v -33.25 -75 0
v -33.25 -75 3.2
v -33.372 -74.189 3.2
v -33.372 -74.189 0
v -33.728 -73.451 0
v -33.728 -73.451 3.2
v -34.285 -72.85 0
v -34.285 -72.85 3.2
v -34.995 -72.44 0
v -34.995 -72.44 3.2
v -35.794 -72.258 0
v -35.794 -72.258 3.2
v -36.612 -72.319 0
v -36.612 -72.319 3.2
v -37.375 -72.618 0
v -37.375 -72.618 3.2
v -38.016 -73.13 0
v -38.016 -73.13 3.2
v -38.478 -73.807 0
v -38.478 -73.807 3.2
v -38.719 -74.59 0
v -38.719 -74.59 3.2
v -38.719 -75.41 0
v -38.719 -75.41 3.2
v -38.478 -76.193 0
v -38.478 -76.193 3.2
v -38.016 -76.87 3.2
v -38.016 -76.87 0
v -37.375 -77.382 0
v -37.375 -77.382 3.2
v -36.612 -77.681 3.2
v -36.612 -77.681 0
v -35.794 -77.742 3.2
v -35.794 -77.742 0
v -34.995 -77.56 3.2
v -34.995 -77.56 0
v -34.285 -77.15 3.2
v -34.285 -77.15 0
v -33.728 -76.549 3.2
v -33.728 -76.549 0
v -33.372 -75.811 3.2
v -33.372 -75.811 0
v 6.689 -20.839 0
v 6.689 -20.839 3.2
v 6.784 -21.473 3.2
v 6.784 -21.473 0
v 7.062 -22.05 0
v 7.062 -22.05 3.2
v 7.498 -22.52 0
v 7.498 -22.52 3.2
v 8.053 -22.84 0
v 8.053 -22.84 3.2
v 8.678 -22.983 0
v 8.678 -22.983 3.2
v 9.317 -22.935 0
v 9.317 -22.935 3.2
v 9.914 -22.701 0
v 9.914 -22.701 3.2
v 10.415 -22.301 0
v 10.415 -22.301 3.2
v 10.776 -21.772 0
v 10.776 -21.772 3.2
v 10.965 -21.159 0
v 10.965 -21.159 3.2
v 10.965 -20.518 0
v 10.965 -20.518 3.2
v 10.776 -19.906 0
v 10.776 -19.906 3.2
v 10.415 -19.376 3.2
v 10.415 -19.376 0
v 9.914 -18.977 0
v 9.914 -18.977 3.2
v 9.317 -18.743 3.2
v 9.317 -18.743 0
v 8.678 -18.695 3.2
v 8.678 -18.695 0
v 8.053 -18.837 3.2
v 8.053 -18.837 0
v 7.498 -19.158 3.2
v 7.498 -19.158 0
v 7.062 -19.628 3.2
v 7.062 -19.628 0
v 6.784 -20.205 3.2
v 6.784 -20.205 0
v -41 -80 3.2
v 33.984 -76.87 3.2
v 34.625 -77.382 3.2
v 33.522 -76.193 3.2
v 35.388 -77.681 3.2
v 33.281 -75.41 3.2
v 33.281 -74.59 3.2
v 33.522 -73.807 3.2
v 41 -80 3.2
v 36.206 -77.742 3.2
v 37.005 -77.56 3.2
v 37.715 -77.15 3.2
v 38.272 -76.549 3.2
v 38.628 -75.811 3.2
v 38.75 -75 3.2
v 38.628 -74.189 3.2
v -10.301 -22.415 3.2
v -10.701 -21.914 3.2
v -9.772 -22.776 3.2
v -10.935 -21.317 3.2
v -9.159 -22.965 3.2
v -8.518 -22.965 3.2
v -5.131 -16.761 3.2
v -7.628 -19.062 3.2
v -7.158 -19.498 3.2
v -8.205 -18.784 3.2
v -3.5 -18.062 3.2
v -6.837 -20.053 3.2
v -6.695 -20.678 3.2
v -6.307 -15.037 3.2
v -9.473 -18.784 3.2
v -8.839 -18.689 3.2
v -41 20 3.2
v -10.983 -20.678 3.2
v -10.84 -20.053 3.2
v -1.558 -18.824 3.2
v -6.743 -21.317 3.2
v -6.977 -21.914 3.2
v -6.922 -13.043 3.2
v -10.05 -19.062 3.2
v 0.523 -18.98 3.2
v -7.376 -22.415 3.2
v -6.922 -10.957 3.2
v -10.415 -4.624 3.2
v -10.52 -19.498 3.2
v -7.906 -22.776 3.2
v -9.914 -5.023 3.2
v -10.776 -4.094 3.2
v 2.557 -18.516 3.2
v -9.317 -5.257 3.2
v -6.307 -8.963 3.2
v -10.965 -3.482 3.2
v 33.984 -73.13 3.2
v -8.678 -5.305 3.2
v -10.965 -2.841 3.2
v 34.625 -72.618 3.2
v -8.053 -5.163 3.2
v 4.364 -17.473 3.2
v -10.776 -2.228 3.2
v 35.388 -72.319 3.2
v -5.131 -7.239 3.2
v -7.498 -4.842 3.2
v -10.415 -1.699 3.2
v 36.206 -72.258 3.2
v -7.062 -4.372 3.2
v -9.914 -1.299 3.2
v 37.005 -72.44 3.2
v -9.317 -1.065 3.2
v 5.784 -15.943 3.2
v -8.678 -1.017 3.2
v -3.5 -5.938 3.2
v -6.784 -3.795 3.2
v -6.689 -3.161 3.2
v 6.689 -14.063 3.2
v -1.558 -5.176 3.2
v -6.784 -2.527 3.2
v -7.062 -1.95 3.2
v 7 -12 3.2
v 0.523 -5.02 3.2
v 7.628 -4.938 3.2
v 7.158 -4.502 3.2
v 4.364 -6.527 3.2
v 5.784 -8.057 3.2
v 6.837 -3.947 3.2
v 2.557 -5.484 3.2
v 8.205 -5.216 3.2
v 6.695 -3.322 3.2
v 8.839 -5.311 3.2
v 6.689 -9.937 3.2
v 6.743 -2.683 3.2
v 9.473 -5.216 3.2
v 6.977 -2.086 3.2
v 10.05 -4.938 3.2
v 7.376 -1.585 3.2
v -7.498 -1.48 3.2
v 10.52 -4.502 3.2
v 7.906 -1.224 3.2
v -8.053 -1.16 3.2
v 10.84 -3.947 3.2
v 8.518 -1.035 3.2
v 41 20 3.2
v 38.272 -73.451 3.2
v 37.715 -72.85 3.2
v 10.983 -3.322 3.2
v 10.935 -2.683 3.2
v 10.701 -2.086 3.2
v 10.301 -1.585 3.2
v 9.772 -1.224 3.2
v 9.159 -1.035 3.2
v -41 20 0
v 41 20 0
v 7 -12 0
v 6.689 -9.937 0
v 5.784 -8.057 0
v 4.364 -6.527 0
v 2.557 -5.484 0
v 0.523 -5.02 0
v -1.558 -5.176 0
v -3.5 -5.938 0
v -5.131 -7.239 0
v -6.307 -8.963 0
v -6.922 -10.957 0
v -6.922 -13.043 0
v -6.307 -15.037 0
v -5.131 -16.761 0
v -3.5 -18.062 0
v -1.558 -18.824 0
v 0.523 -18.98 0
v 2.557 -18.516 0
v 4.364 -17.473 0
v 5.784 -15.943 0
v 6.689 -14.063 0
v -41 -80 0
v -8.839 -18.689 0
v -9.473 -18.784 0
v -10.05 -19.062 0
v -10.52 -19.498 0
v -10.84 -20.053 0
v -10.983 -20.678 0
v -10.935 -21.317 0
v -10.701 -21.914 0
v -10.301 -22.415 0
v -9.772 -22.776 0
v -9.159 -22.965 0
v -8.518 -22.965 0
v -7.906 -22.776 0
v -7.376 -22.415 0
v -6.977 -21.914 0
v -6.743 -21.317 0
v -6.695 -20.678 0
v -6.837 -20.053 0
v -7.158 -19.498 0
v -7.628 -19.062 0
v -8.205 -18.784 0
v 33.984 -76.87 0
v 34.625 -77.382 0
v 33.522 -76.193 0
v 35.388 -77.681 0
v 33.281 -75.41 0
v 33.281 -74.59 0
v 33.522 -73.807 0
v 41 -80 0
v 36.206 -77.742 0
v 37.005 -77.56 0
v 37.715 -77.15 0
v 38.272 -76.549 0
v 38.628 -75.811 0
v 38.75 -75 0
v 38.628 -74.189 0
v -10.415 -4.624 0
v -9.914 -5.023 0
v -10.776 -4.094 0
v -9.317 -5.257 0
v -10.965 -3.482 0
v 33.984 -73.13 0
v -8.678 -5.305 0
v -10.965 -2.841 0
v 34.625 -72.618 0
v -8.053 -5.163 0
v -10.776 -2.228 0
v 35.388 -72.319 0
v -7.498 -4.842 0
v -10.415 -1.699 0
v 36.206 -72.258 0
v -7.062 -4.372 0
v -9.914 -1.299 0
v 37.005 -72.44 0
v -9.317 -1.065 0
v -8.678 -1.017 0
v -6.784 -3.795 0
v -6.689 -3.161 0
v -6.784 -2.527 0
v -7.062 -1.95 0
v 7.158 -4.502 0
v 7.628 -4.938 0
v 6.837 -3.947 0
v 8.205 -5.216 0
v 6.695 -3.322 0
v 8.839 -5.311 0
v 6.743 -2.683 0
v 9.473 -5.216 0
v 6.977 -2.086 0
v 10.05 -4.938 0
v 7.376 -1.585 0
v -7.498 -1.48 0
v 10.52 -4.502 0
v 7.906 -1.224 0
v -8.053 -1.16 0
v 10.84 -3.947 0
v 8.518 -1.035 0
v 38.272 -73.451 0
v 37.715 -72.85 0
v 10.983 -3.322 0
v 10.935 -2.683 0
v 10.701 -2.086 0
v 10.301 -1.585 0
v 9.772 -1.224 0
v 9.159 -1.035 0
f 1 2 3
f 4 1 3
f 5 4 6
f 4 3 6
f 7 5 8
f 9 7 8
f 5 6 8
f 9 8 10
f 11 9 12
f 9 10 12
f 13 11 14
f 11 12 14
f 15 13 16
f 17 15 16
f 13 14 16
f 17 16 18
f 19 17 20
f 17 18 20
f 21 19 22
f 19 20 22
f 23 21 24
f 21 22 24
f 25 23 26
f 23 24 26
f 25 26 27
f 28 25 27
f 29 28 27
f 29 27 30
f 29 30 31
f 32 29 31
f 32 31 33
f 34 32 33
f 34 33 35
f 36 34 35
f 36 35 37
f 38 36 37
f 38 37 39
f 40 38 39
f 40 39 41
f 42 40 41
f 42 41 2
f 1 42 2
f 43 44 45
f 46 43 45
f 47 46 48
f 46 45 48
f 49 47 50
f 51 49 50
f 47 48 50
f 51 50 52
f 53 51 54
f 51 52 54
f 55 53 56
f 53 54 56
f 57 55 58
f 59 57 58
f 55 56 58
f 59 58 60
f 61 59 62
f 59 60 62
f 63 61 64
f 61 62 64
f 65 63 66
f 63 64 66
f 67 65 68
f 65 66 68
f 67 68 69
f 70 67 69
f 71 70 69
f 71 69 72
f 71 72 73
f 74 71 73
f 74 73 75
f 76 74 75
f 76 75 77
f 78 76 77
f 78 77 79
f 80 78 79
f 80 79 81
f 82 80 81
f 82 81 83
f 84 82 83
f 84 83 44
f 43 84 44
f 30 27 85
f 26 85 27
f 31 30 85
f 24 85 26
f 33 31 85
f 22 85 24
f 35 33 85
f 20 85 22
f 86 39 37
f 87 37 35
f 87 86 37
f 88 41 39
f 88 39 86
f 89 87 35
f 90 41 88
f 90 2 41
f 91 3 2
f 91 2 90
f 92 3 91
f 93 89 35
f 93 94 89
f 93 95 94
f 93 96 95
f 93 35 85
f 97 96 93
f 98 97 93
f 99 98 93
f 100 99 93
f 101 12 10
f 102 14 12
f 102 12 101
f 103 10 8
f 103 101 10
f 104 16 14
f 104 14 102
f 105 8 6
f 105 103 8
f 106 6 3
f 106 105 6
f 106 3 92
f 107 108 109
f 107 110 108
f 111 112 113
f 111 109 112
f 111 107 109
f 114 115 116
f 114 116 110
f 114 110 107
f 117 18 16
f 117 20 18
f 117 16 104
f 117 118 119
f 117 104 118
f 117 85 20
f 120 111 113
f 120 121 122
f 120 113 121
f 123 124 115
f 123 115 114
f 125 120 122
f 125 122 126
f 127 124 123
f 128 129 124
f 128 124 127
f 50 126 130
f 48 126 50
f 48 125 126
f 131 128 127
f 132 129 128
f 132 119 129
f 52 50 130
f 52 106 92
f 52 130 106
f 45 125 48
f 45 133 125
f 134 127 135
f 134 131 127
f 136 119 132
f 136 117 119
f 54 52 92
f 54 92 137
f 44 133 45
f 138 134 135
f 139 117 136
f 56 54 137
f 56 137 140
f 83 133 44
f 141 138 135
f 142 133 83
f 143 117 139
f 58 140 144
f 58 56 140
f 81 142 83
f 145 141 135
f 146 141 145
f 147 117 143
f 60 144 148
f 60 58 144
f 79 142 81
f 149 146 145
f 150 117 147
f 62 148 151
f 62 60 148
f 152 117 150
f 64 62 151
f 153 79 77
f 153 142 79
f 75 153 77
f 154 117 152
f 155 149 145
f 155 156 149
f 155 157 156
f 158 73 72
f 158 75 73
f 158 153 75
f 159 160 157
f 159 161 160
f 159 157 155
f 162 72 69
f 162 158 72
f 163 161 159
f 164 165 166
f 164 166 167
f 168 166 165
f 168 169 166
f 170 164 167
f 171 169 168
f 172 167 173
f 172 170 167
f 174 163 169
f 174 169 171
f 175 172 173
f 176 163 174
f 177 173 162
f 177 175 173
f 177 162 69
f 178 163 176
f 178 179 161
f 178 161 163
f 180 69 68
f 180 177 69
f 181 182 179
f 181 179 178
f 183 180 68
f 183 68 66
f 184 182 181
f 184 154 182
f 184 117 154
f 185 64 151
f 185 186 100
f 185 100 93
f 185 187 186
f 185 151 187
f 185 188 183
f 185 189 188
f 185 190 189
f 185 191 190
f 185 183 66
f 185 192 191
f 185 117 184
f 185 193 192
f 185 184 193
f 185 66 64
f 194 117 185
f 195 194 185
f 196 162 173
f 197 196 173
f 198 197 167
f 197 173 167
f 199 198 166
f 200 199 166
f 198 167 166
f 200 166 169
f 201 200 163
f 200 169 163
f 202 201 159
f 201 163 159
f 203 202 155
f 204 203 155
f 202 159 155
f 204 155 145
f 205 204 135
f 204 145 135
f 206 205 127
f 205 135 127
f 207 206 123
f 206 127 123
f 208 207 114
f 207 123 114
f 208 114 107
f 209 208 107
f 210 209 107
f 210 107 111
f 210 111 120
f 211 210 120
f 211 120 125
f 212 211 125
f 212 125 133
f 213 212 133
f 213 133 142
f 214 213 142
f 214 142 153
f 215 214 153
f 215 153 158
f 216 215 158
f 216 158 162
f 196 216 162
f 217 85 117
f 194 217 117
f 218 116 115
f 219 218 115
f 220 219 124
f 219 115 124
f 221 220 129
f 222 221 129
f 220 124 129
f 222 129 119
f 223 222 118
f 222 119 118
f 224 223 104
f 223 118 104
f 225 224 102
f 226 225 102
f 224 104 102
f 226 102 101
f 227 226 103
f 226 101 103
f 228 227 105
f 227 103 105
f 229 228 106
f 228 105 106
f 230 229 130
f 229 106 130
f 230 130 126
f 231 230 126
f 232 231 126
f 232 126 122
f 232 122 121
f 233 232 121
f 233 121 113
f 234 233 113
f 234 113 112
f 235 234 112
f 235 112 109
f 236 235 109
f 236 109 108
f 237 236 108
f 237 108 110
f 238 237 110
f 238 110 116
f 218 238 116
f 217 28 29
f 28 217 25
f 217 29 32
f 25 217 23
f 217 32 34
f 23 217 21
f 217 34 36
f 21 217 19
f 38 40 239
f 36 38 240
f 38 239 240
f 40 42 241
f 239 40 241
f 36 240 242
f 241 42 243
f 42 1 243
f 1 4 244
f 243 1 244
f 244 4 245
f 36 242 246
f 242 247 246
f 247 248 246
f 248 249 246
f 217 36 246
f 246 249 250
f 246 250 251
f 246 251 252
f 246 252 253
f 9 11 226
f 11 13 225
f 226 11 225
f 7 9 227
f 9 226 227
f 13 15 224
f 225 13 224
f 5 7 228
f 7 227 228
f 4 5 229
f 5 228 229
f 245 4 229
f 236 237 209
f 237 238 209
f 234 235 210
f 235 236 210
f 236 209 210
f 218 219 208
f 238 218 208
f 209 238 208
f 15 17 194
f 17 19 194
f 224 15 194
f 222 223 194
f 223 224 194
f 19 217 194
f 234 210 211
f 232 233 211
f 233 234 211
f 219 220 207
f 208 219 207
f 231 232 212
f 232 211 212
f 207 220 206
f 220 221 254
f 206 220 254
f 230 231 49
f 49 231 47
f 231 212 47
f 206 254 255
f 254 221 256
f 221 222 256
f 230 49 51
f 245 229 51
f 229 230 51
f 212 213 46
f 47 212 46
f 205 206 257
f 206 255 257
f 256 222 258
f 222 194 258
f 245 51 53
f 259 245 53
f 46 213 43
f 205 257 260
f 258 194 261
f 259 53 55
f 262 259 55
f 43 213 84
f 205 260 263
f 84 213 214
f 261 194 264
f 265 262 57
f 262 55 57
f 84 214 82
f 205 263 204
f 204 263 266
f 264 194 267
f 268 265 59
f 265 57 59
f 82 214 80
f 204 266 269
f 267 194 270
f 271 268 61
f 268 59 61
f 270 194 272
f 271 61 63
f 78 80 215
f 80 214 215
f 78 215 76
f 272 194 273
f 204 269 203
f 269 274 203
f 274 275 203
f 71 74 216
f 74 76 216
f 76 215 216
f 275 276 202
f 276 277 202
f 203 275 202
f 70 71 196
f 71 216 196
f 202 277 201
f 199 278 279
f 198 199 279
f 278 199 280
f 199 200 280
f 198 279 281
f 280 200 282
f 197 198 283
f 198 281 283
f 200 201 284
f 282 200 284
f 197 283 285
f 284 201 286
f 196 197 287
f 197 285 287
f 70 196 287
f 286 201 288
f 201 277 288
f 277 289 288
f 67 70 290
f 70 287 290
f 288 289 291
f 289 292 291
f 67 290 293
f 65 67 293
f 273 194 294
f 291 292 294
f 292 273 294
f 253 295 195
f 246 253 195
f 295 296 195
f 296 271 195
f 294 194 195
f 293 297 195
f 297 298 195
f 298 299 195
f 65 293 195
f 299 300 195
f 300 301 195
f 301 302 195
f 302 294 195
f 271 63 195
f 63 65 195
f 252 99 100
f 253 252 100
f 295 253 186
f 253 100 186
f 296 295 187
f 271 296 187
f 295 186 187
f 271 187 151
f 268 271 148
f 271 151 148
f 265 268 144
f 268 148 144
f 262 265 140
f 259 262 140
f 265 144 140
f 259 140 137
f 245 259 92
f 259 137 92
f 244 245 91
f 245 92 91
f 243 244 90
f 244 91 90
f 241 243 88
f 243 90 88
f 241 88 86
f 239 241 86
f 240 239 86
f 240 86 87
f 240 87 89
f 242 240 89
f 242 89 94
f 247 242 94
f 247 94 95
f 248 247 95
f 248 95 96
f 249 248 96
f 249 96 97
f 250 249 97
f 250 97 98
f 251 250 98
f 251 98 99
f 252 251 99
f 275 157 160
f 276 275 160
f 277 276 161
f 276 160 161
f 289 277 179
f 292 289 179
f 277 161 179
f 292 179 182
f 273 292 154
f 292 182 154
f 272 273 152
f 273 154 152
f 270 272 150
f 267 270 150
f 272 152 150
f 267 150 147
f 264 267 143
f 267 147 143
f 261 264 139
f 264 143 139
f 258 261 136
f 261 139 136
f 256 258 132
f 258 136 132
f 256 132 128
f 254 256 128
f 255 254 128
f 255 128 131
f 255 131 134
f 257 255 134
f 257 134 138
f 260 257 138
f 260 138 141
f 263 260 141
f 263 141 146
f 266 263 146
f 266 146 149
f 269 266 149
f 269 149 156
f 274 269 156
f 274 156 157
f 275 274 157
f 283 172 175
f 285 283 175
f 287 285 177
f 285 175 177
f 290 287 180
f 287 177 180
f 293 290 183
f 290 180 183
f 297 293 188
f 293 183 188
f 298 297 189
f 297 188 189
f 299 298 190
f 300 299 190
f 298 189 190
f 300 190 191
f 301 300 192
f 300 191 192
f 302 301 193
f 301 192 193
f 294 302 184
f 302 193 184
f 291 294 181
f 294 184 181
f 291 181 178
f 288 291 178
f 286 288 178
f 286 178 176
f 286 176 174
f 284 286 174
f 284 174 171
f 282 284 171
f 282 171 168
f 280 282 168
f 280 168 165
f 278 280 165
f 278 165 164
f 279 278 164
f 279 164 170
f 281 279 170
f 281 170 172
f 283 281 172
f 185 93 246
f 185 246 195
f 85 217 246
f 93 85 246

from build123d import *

# Parameters (mm, degrees)
SKETCH1_W           = 150
SKETCH1_H           = 160
BOSS_EXTRUDE1_DEPTH = 3.2
CUT_EXTRUDE1_REACH  = 5.2
SKETCH2_R           = 7
SKETCH2_R_2         = 2.75
SKETCH3_R           = 2.15
CUT_EXTRUDE2_DEPTH  = 4.2
CIRPATTERN1_COUNT   = 4
SKETCH5_OUTSIDE_W   = 195.868
SKETCH5_OUTSIDE_H   = 205.868
SKETCH5_OUTSIDE_W_2 = 82
SKETCH5_OUTSIDE_H_2 = 100
CUT_EXTRUDE4_DEPTH  = 10


with BuildPart() as part:
    # Sketch1 → Boss-Extrude1 (new body)
    with BuildSketch(Plane.XY):
        Rectangle(SKETCH1_W, SKETCH1_H)
    extrude(amount=BOSS_EXTRUDE1_DEPTH)

    # Sketch2 → Cut-Extrude1 (cut, up to next)
    with BuildSketch(Plane.XY.offset(3.2), mode=Mode.PRIVATE) as cut_extrude1_sk1:
        with Locations((0, -12)):
            Circle(SKETCH2_R)
    cut_extrude1_tool1 = extrude(cut_extrude1_sk1.sketch, amount=-CUT_EXTRUDE1_REACH, mode=Mode.PRIVATE) & part.part
    add(cut_extrude1_tool1.solids().sort_by_distance((0, -12, 3.2))[0], mode=Mode.SUBTRACT)
    # Sketch2 → Cut-Extrude1 (cut, up to next)
    with BuildSketch(Plane.XY.offset(3.2), mode=Mode.PRIVATE) as cut_extrude1_sk2:
        with Locations((-36, -75)):
            Circle(SKETCH2_R_2)
    cut_extrude1_tool2 = extrude(cut_extrude1_sk2.sketch, amount=-CUT_EXTRUDE1_REACH, mode=Mode.PRIVATE) & part.part
    add(cut_extrude1_tool2.solids().sort_by_distance((-36, -75, 3.2))[0], mode=Mode.SUBTRACT)
    # Sketch2 → Cut-Extrude1 (cut, up to next)
    with BuildSketch(Plane.XY.offset(3.2), mode=Mode.PRIVATE) as cut_extrude1_sk3:
        with Locations((36, -75)):
            Circle(SKETCH2_R_2)
    cut_extrude1_tool3 = extrude(cut_extrude1_sk3.sketch, amount=-CUT_EXTRUDE1_REACH, mode=Mode.PRIVATE) & part.part
    add(cut_extrude1_tool3.solids().sort_by_distance((36, -75, 3.2))[0], mode=Mode.SUBTRACT)

    # Sketch3 → Cut-Extrude2 (cut, through all)
    with BuildSketch(Plane.XY.offset(3.2)):
        with Locations((-8.838834765, -3.161165235)):
            Circle(SKETCH3_R)
    cut_extrude2 = extrude(amount=-CUT_EXTRUDE2_DEPTH, mode=Mode.SUBTRACT)

    # CirPattern1: Cut-Extrude2 ×4 about axis
    cirpattern1_axis = Axis((0, -12, 0), (0, 0, 1))
    for i in range(1, CIRPATTERN1_COUNT):
        add(cut_extrude2.rotate(cirpattern1_axis, i * 360 / CIRPATTERN1_COUNT), mode=Mode.SUBTRACT)

    # Sketch5 outside → Cut-Extrude4 (cut)
    with BuildSketch(Plane.XY.offset(3.2)):
        Rectangle(SKETCH5_OUTSIDE_W, SKETCH5_OUTSIDE_H)
        with Locations((0, -30)):
            Rectangle(SKETCH5_OUTSIDE_W_2, SKETCH5_OUTSIDE_H_2, mode=Mode.SUBTRACT)
    extrude(amount=-CUT_EXTRUDE4_DEPTH, mode=Mode.SUBTRACT)


solid = part.part
